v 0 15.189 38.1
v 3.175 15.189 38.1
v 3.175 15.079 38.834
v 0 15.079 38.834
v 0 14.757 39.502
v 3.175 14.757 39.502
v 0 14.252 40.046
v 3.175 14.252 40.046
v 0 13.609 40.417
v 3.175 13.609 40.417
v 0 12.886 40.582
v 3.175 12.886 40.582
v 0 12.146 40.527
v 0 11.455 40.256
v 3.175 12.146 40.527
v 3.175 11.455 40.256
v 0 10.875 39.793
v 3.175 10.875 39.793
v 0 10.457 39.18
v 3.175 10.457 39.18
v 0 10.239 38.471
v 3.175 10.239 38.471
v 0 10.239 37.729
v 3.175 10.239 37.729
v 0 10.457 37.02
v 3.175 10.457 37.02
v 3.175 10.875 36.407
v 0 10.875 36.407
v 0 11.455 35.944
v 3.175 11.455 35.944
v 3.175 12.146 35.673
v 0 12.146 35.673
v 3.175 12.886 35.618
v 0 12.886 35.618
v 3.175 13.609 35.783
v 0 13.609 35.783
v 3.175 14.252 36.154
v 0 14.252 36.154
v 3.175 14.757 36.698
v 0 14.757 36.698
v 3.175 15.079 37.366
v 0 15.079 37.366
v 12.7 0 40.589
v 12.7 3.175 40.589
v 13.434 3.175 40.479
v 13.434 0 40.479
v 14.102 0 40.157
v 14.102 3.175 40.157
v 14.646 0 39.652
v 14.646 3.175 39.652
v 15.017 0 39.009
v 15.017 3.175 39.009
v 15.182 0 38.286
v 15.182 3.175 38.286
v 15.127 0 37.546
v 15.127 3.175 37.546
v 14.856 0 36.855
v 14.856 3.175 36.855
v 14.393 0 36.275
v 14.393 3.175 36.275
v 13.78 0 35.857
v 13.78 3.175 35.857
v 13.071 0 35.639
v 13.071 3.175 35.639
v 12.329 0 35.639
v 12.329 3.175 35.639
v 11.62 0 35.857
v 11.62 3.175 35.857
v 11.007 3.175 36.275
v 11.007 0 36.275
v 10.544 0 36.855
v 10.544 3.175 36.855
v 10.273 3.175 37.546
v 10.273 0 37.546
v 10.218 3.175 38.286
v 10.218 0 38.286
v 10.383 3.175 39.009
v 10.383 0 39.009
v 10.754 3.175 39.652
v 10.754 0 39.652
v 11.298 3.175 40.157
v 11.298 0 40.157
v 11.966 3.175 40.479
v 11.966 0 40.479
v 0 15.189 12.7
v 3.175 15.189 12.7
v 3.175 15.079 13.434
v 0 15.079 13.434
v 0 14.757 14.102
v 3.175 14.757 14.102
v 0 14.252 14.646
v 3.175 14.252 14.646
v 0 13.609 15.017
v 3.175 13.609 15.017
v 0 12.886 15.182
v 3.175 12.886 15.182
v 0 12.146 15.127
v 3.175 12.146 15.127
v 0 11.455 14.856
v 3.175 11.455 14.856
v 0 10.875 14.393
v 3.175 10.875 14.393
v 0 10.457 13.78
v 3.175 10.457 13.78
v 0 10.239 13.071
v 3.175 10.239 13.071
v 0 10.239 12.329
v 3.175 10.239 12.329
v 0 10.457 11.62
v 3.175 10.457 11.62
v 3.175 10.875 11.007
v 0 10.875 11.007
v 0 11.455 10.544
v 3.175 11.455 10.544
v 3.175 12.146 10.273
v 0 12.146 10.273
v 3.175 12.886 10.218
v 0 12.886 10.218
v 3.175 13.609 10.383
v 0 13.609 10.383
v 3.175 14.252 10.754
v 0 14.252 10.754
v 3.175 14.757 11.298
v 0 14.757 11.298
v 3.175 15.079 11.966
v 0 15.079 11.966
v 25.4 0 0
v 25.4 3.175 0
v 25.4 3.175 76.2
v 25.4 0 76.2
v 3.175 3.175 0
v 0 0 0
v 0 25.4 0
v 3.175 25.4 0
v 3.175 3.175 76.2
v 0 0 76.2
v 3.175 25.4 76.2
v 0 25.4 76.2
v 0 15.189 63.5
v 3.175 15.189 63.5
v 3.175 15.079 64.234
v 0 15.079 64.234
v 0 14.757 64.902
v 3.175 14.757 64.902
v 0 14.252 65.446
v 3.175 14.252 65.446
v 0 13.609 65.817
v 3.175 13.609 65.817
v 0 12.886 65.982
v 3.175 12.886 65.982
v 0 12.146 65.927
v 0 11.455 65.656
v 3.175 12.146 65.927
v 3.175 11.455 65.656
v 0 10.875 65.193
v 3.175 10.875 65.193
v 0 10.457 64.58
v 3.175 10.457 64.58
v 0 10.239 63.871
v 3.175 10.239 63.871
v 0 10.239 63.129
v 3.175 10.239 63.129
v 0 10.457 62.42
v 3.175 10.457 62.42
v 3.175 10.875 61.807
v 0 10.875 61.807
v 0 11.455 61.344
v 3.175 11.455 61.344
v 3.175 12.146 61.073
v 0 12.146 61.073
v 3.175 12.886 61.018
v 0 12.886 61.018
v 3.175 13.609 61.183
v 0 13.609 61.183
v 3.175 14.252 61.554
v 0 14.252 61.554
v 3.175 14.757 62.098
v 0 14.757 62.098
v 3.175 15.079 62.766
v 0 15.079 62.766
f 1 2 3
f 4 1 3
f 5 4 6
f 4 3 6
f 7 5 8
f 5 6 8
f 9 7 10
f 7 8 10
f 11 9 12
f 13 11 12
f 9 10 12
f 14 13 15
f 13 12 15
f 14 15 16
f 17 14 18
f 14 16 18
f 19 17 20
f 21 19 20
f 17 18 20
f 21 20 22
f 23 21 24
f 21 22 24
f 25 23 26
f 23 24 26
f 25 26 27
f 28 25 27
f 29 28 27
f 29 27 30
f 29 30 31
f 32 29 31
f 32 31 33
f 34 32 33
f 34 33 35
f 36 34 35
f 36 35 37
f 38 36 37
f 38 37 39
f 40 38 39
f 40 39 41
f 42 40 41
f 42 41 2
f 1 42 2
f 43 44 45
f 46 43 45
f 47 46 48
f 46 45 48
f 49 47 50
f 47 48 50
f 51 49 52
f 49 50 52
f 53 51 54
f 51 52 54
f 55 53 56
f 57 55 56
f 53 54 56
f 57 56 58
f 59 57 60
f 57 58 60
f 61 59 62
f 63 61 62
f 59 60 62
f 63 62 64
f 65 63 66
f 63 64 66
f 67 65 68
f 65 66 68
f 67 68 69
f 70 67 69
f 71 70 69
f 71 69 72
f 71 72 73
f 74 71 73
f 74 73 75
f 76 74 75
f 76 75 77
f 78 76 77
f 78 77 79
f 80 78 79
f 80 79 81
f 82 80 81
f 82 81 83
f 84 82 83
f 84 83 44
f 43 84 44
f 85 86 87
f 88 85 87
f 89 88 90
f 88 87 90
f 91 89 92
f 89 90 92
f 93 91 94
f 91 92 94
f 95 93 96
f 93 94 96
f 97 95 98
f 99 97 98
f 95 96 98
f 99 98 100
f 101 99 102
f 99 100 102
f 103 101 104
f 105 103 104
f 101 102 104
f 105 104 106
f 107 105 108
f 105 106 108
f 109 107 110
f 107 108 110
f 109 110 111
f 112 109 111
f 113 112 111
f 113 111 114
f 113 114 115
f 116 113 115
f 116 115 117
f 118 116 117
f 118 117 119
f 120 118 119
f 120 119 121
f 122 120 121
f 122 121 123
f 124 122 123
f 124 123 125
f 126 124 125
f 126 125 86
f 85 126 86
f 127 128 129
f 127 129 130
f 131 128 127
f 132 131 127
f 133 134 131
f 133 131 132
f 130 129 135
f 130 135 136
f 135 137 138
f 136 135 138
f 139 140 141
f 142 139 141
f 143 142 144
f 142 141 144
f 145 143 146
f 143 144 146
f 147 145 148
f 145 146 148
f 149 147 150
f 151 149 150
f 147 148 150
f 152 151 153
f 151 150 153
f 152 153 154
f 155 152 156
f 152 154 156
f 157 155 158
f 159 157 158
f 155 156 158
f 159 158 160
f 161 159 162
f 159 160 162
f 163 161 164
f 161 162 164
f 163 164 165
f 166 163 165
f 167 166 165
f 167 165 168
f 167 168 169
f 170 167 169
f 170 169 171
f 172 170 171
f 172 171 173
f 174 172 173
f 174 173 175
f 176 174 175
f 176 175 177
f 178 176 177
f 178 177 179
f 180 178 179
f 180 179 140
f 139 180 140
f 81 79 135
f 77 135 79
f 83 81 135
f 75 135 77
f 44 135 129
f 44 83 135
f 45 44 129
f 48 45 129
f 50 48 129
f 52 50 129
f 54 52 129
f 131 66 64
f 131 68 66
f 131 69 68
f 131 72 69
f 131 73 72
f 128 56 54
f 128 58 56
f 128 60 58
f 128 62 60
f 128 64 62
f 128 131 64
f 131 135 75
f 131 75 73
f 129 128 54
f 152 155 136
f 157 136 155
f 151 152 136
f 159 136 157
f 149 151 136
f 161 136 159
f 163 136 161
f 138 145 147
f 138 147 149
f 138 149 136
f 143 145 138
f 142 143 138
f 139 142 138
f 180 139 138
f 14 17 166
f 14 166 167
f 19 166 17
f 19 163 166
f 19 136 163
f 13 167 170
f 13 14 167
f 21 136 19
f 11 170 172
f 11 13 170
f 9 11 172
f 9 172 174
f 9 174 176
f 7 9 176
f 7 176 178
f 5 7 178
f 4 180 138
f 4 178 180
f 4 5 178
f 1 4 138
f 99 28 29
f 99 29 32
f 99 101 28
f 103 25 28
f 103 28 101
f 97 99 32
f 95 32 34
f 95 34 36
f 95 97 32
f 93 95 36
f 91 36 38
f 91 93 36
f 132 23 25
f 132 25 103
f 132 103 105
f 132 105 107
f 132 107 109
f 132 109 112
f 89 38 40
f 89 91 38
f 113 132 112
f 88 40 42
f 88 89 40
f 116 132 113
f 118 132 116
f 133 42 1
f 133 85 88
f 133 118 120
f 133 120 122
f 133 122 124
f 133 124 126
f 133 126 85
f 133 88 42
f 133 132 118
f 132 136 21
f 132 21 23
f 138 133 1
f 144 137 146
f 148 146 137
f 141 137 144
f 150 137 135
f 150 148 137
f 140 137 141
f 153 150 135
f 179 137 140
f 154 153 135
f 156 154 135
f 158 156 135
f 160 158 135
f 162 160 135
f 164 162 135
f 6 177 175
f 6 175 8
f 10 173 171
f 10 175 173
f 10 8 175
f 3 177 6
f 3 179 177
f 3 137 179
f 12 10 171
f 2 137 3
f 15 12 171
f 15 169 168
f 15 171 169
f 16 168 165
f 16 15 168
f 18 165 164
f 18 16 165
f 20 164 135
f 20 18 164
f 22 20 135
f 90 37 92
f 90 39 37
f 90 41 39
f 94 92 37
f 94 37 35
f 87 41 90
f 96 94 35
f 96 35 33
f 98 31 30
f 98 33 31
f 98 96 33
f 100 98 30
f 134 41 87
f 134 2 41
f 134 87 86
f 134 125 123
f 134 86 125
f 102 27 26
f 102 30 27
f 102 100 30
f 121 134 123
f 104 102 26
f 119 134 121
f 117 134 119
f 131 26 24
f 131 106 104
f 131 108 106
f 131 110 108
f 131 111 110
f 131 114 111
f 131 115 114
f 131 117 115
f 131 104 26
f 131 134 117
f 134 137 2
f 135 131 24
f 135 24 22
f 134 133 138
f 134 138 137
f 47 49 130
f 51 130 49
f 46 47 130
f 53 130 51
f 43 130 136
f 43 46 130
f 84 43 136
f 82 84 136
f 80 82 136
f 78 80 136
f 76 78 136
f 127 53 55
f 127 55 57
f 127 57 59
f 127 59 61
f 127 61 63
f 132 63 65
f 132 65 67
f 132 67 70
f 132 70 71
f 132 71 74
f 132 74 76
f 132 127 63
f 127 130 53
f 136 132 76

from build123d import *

# Parameters (mm, degrees)
BOSS_EXTRUDE1_DEPTH = 76.2
SKETCH7_R           = 2.4892
CUT_EXTRUDE4_DEPTH  = 84.339970152
SKETCH8_R           = 2.4892
CUT_EXTRUDE5_DEPTH  = 84.339970152


with BuildPart() as part:
    # Sketch1 → Boss-Extrude1 (new body)
    with BuildSketch(Plane.XY):
        Polygon((3.175, 25.4), (3.175, 3.175), (25.4, 3.175), (25.4, 0), (0, 0), (0, 25.4), align=None)
    extrude(amount=BOSS_EXTRUDE1_DEPTH)

    # Sketch7 → Cut-Extrude4 (cut, through all)
    with BuildSketch(Plane(origin=(3.175, 0, 0), x_dir=(0, 0, -1), z_dir=(1, 0, 0))):
        with Locations(Location((-63.5, 12.7, 0), (0, 0, 90))):
            Circle(SKETCH7_R)
        with Locations(Location((-38.1, 12.7, 0), (0, 0, 90))):
            Circle(SKETCH7_R)
        with Locations(Location((-12.7, 12.7, 0), (0, 0, 90))):
            Circle(SKETCH7_R)
    extrude(amount=-CUT_EXTRUDE4_DEPTH, mode=Mode.SUBTRACT)

    # Sketch8 → Cut-Extrude5 (cut, through all)
    with BuildSketch(Plane(origin=(0, 3.175, 0), x_dir=(1, 0, 0), z_dir=(0, 1, 0))):
        with Locations(Location((12.7, -38.1, 0), (0, 0, 270))):
            Circle(SKETCH8_R)
    extrude(amount=-CUT_EXTRUDE5_DEPTH, mode=Mode.SUBTRACT)


solid = part.part
